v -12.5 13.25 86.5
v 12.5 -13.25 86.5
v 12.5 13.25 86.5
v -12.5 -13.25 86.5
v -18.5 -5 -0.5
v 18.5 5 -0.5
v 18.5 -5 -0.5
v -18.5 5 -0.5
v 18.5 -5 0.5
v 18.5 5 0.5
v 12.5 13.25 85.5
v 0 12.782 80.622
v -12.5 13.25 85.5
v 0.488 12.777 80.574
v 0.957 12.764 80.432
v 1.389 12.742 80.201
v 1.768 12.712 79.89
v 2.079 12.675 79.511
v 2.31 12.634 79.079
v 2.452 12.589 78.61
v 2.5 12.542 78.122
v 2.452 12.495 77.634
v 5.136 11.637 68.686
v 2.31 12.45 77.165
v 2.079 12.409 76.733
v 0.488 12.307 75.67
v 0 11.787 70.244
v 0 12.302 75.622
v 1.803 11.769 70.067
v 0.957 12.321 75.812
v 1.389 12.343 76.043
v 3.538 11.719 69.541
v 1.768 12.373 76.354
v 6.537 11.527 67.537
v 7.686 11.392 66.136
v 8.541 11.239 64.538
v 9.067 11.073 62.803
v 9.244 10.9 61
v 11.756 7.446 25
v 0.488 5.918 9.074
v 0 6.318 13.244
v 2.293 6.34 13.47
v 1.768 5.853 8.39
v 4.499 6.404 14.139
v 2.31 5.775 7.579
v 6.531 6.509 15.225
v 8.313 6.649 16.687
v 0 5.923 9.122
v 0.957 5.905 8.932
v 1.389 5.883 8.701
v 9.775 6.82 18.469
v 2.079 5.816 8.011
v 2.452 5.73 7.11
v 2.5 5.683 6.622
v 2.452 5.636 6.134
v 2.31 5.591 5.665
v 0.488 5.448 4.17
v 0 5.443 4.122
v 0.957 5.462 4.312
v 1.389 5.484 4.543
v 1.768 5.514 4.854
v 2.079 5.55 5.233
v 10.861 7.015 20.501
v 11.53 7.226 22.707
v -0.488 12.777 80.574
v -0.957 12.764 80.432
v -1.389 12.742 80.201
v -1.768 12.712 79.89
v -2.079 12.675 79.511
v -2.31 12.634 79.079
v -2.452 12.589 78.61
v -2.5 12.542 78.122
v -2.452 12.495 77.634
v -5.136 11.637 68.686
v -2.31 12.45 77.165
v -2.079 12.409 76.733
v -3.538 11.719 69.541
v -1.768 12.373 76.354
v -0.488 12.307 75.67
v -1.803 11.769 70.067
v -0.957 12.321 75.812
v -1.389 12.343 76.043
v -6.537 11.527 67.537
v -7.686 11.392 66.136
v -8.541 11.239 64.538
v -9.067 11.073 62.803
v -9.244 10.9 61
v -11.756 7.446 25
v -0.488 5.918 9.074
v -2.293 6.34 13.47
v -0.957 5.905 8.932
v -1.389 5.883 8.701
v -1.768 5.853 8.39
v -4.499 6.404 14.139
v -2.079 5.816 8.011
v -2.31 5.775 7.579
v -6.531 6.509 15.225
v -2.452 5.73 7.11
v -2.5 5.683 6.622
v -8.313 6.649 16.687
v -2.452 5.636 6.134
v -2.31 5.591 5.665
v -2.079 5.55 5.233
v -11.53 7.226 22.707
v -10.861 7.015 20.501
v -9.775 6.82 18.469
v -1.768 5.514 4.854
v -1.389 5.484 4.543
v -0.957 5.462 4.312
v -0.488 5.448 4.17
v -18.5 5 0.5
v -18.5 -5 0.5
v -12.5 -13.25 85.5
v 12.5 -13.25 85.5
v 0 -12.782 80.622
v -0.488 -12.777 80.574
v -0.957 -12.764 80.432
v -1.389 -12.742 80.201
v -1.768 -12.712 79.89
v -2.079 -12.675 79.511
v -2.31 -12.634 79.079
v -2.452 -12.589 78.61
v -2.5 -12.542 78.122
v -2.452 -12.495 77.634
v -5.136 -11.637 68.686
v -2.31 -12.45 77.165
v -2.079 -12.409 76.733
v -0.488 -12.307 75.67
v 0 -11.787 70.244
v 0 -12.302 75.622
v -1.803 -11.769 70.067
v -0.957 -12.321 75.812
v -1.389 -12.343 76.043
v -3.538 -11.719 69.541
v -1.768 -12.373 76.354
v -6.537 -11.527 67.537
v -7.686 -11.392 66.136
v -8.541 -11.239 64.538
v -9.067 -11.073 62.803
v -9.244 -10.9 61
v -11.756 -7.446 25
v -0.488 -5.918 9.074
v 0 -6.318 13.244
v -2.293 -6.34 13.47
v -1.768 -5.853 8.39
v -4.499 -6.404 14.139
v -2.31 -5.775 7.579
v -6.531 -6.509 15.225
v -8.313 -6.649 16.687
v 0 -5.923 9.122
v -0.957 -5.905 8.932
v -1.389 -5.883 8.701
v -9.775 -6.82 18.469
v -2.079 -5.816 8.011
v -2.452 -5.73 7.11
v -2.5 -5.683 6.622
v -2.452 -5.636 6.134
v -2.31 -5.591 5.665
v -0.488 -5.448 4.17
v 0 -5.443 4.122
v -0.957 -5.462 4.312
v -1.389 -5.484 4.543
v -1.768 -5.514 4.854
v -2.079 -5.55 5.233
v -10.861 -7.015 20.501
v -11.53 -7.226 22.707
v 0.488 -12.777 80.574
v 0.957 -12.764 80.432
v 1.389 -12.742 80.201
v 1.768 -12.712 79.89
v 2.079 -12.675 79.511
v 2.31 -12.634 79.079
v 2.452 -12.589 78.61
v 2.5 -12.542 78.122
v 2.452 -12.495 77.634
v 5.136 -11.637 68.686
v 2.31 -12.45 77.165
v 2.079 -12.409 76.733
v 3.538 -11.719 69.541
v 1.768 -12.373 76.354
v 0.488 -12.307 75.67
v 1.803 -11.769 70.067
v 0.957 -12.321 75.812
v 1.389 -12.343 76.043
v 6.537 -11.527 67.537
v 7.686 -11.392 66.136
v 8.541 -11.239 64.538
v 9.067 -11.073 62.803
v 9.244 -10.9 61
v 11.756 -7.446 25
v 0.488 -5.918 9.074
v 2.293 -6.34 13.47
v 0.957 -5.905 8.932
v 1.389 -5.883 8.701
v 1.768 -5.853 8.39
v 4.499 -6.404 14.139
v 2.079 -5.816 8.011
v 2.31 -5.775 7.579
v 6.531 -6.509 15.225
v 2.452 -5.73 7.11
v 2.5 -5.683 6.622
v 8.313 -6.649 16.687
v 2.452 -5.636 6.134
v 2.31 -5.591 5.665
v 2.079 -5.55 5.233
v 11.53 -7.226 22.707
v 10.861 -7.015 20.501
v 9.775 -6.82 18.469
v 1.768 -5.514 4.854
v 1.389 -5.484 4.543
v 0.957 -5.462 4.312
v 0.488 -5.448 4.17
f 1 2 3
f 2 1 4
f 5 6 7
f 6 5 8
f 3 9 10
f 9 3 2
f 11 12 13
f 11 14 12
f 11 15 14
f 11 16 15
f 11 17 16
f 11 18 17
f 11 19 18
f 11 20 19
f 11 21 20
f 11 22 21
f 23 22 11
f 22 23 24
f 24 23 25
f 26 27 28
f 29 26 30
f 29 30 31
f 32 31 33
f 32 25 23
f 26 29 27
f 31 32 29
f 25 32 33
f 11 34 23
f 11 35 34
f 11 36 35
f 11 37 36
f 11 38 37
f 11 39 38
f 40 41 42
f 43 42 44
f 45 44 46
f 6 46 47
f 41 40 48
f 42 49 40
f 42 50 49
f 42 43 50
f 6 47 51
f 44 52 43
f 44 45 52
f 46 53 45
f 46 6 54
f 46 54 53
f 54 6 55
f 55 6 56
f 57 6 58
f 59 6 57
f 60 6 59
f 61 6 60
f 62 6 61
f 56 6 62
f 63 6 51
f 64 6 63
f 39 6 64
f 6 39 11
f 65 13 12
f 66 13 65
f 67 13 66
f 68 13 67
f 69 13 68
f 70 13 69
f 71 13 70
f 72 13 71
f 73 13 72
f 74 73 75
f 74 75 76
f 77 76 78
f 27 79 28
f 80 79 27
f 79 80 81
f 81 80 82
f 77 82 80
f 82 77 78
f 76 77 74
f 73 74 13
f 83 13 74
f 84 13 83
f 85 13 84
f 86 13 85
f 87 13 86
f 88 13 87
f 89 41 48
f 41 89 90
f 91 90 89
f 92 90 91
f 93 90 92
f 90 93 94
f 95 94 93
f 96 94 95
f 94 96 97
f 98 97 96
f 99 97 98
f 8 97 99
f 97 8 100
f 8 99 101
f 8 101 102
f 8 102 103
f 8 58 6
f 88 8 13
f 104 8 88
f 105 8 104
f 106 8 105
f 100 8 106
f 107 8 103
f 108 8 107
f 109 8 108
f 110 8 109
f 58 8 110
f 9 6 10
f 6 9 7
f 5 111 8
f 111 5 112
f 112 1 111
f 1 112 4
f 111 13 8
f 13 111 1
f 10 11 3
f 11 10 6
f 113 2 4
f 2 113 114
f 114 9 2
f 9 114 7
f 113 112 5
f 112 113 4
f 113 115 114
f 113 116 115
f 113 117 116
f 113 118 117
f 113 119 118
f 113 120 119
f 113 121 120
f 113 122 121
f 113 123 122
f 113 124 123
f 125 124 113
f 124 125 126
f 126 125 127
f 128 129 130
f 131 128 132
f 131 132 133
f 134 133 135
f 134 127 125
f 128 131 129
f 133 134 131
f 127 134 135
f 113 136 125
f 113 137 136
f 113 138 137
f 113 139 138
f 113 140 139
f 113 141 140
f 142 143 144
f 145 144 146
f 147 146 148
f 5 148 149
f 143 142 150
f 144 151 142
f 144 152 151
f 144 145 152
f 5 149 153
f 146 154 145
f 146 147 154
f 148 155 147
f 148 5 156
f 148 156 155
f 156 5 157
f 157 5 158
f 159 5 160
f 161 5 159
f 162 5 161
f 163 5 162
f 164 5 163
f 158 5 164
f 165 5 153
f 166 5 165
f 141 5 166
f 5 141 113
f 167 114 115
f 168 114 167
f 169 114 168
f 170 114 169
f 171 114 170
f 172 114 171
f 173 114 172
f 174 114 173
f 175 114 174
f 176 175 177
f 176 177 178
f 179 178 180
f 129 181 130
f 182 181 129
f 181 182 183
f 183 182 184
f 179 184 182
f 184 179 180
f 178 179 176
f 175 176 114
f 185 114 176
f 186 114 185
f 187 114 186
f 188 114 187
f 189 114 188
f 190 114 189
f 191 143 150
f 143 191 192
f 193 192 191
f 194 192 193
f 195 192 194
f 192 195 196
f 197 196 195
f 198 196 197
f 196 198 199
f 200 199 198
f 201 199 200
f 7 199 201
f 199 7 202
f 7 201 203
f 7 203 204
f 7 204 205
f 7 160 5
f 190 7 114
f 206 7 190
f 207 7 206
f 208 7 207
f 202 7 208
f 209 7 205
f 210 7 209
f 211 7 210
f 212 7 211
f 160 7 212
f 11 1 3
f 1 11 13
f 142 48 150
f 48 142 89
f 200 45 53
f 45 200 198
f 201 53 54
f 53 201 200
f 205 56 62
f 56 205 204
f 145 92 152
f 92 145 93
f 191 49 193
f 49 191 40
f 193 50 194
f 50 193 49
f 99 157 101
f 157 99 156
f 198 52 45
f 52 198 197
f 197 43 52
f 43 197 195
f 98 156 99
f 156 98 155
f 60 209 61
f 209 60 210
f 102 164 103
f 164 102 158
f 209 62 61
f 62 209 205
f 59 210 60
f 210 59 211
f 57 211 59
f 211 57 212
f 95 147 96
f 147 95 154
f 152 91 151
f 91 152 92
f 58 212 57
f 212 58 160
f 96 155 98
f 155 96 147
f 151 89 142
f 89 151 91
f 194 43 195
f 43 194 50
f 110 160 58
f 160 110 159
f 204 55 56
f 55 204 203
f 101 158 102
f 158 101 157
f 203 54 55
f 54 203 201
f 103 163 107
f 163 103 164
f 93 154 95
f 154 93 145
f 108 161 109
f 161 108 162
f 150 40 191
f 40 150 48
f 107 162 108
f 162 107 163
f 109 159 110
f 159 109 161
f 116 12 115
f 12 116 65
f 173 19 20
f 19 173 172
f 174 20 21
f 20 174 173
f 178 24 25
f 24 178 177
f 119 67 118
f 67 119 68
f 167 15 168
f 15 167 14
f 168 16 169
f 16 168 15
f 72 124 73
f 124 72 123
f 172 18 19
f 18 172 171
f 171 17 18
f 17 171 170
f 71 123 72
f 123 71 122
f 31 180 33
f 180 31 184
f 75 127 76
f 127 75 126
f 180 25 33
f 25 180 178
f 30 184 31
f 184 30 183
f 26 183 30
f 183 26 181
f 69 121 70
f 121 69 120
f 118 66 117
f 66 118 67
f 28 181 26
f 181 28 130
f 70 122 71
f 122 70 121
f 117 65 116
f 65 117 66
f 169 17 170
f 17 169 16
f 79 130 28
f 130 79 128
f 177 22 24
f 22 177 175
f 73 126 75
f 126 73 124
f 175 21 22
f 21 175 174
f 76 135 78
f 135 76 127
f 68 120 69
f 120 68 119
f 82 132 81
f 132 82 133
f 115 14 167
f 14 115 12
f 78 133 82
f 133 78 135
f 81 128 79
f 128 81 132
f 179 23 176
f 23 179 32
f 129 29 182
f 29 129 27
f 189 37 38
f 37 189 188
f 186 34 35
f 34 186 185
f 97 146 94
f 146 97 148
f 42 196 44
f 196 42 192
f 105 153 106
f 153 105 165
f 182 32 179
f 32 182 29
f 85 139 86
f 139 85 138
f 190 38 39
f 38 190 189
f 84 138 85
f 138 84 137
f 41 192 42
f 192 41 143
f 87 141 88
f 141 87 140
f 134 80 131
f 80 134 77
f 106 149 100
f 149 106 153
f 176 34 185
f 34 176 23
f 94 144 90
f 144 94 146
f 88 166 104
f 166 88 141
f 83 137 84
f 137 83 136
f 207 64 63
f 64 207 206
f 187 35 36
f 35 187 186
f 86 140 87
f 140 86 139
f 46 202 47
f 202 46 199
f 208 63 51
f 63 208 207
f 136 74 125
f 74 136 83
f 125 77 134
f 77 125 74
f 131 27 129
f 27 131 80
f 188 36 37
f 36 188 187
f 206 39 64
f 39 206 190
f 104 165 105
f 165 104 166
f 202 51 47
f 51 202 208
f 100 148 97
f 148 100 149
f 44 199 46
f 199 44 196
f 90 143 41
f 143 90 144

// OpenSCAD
/*
Parameterized IKEA Samla Wedge NG
Copyright (C) 2024  nomike[AT]nomike[DOT]com

Redistribution and use in source and binary forms, with or without
modification, are permitted provided that the following conditions are met:

1. Redistributions of source code must retain the above copyright notice, this
list of conditions and the following disclaimer.

2. Redistributions in binary form must reproduce the above copyright notice,
this list of conditions and the following disclaimer in the documentation
and/or other materials provided with the distribution.

THIS SOFTWARE IS PROVIDED BY THE COPYRIGHT HOLDERS AND CONTRIBUTORS “AS IS” AND
ANY EXPRESS OR IMPLIED WARRANTIES, INCLUDING, BUT NOT LIMITED TO, THE IMPLIED
WARRANTIES OF MERCHANTABILITY AND FITNESS FOR A PARTICULAR PURPOSE ARE
DISCLAIMED. IN NO EVENT SHALL THE COPYRIGHT HOLDER OR CONTRIBUTORS BE LIABLE FOR
ANY DIRECT, INDIRECT, INCIDENTAL, SPECIAL, EXEMPLARY, OR CONSEQUENTIAL DAMAGES
(INCLUDING, BUT NOT LIMITED TO, PROCUREMENT OF SUBSTITUTE GOODS OR SERVICES;
LOSS OF USE, DATA, OR PROFITS; OR BUSINESS INTERRUPTION) HOWEVER CAUSED AND ON
ANY THEORY OF LIABILITY, WHETHER IN CONTRACT, STRICT LIABILITY, OR TORT
(INCLUDING NEGLIGENCE OR OTHERWISE) ARISING IN ANY WAY OUT OF THE USE OF THIS
SOFTWARE, EVEN IF ADVISED OF THE POSSIBILITY OF SUCH DAMAGE.
*/

// Parameterized IKEA Samla Wedge NG
// created by nomike
// originally created by iggy who remixed
// https://www.thingiverse.com/thing:479007 by Dvogonen


total_height = 87;
bottom_x = 37;
bottom_y = 10;
top_x = 25;
top_y = 26.5;
// Holes for putting zip-ties through
hole_diameter = 5;
// gap between the top/bottom surface and the rim of the oval cutout
oval_z_offset = 25;
// gap between the sides and the oval cutout; Set to something big to remove the cutout completely
oval_y_offset = 10;

/* [Hidden] */
x = 12;

_calculated_height = total_height - 1;
_bottom_oval_z_offset = oval_z_offset;
_top_oval_z_offset_from_top = _calculated_height - oval_z_offset;
_wide_z_offset = _calculated_height;
_oval_top_diameter = bottom_x - (((_wide_z_offset - oval_z_offset)/_calculated_height)*(bottom_x - top_x)) - oval_y_offset;
_oval_bottom_diameter = bottom_x - ((oval_z_offset/_calculated_height)*(bottom_x - top_x)) - oval_y_offset;

_bottom_hole_offset = (_bottom_oval_z_offset - (_oval_bottom_diameter / 2)) / 2;
_top_hole_offset = _top_oval_z_offset_from_top + ((_calculated_height  
- _top_oval_z_offset_from_top) / 2) + (_oval_top_diameter / 4);

difference (){
    color("green") hull(){
        cube([bottom_x,bottom_y,1],center=true);
        translate([0,0,_wide_z_offset]) cube([top_x,top_y,1],center=true);
    }

    color("red") translate([0,0,_bottom_hole_offset]) rotate([90,0,0]) cylinder(d=hole_diameter,h=top_y,center=true,$fn=32);
    color("blue") translate([0,0,_top_hole_offset]) rotate([90,0,0]) cylinder(d=hole_diameter,h=top_y+10,center=true,$fn=32);
    color("magenta") hull(){
        translate([0,0, _bottom_oval_z_offset]) rotate([90,0,0]) cylinder(d=_oval_bottom_diameter,h=top_y,center=true,$fn=32);
        translate([0,0, _top_oval_z_offset_from_top]) rotate([90,0,0]) cylinder(d=_oval_top_diameter,h=top_y,center=true,$fn=32);
    }
}
